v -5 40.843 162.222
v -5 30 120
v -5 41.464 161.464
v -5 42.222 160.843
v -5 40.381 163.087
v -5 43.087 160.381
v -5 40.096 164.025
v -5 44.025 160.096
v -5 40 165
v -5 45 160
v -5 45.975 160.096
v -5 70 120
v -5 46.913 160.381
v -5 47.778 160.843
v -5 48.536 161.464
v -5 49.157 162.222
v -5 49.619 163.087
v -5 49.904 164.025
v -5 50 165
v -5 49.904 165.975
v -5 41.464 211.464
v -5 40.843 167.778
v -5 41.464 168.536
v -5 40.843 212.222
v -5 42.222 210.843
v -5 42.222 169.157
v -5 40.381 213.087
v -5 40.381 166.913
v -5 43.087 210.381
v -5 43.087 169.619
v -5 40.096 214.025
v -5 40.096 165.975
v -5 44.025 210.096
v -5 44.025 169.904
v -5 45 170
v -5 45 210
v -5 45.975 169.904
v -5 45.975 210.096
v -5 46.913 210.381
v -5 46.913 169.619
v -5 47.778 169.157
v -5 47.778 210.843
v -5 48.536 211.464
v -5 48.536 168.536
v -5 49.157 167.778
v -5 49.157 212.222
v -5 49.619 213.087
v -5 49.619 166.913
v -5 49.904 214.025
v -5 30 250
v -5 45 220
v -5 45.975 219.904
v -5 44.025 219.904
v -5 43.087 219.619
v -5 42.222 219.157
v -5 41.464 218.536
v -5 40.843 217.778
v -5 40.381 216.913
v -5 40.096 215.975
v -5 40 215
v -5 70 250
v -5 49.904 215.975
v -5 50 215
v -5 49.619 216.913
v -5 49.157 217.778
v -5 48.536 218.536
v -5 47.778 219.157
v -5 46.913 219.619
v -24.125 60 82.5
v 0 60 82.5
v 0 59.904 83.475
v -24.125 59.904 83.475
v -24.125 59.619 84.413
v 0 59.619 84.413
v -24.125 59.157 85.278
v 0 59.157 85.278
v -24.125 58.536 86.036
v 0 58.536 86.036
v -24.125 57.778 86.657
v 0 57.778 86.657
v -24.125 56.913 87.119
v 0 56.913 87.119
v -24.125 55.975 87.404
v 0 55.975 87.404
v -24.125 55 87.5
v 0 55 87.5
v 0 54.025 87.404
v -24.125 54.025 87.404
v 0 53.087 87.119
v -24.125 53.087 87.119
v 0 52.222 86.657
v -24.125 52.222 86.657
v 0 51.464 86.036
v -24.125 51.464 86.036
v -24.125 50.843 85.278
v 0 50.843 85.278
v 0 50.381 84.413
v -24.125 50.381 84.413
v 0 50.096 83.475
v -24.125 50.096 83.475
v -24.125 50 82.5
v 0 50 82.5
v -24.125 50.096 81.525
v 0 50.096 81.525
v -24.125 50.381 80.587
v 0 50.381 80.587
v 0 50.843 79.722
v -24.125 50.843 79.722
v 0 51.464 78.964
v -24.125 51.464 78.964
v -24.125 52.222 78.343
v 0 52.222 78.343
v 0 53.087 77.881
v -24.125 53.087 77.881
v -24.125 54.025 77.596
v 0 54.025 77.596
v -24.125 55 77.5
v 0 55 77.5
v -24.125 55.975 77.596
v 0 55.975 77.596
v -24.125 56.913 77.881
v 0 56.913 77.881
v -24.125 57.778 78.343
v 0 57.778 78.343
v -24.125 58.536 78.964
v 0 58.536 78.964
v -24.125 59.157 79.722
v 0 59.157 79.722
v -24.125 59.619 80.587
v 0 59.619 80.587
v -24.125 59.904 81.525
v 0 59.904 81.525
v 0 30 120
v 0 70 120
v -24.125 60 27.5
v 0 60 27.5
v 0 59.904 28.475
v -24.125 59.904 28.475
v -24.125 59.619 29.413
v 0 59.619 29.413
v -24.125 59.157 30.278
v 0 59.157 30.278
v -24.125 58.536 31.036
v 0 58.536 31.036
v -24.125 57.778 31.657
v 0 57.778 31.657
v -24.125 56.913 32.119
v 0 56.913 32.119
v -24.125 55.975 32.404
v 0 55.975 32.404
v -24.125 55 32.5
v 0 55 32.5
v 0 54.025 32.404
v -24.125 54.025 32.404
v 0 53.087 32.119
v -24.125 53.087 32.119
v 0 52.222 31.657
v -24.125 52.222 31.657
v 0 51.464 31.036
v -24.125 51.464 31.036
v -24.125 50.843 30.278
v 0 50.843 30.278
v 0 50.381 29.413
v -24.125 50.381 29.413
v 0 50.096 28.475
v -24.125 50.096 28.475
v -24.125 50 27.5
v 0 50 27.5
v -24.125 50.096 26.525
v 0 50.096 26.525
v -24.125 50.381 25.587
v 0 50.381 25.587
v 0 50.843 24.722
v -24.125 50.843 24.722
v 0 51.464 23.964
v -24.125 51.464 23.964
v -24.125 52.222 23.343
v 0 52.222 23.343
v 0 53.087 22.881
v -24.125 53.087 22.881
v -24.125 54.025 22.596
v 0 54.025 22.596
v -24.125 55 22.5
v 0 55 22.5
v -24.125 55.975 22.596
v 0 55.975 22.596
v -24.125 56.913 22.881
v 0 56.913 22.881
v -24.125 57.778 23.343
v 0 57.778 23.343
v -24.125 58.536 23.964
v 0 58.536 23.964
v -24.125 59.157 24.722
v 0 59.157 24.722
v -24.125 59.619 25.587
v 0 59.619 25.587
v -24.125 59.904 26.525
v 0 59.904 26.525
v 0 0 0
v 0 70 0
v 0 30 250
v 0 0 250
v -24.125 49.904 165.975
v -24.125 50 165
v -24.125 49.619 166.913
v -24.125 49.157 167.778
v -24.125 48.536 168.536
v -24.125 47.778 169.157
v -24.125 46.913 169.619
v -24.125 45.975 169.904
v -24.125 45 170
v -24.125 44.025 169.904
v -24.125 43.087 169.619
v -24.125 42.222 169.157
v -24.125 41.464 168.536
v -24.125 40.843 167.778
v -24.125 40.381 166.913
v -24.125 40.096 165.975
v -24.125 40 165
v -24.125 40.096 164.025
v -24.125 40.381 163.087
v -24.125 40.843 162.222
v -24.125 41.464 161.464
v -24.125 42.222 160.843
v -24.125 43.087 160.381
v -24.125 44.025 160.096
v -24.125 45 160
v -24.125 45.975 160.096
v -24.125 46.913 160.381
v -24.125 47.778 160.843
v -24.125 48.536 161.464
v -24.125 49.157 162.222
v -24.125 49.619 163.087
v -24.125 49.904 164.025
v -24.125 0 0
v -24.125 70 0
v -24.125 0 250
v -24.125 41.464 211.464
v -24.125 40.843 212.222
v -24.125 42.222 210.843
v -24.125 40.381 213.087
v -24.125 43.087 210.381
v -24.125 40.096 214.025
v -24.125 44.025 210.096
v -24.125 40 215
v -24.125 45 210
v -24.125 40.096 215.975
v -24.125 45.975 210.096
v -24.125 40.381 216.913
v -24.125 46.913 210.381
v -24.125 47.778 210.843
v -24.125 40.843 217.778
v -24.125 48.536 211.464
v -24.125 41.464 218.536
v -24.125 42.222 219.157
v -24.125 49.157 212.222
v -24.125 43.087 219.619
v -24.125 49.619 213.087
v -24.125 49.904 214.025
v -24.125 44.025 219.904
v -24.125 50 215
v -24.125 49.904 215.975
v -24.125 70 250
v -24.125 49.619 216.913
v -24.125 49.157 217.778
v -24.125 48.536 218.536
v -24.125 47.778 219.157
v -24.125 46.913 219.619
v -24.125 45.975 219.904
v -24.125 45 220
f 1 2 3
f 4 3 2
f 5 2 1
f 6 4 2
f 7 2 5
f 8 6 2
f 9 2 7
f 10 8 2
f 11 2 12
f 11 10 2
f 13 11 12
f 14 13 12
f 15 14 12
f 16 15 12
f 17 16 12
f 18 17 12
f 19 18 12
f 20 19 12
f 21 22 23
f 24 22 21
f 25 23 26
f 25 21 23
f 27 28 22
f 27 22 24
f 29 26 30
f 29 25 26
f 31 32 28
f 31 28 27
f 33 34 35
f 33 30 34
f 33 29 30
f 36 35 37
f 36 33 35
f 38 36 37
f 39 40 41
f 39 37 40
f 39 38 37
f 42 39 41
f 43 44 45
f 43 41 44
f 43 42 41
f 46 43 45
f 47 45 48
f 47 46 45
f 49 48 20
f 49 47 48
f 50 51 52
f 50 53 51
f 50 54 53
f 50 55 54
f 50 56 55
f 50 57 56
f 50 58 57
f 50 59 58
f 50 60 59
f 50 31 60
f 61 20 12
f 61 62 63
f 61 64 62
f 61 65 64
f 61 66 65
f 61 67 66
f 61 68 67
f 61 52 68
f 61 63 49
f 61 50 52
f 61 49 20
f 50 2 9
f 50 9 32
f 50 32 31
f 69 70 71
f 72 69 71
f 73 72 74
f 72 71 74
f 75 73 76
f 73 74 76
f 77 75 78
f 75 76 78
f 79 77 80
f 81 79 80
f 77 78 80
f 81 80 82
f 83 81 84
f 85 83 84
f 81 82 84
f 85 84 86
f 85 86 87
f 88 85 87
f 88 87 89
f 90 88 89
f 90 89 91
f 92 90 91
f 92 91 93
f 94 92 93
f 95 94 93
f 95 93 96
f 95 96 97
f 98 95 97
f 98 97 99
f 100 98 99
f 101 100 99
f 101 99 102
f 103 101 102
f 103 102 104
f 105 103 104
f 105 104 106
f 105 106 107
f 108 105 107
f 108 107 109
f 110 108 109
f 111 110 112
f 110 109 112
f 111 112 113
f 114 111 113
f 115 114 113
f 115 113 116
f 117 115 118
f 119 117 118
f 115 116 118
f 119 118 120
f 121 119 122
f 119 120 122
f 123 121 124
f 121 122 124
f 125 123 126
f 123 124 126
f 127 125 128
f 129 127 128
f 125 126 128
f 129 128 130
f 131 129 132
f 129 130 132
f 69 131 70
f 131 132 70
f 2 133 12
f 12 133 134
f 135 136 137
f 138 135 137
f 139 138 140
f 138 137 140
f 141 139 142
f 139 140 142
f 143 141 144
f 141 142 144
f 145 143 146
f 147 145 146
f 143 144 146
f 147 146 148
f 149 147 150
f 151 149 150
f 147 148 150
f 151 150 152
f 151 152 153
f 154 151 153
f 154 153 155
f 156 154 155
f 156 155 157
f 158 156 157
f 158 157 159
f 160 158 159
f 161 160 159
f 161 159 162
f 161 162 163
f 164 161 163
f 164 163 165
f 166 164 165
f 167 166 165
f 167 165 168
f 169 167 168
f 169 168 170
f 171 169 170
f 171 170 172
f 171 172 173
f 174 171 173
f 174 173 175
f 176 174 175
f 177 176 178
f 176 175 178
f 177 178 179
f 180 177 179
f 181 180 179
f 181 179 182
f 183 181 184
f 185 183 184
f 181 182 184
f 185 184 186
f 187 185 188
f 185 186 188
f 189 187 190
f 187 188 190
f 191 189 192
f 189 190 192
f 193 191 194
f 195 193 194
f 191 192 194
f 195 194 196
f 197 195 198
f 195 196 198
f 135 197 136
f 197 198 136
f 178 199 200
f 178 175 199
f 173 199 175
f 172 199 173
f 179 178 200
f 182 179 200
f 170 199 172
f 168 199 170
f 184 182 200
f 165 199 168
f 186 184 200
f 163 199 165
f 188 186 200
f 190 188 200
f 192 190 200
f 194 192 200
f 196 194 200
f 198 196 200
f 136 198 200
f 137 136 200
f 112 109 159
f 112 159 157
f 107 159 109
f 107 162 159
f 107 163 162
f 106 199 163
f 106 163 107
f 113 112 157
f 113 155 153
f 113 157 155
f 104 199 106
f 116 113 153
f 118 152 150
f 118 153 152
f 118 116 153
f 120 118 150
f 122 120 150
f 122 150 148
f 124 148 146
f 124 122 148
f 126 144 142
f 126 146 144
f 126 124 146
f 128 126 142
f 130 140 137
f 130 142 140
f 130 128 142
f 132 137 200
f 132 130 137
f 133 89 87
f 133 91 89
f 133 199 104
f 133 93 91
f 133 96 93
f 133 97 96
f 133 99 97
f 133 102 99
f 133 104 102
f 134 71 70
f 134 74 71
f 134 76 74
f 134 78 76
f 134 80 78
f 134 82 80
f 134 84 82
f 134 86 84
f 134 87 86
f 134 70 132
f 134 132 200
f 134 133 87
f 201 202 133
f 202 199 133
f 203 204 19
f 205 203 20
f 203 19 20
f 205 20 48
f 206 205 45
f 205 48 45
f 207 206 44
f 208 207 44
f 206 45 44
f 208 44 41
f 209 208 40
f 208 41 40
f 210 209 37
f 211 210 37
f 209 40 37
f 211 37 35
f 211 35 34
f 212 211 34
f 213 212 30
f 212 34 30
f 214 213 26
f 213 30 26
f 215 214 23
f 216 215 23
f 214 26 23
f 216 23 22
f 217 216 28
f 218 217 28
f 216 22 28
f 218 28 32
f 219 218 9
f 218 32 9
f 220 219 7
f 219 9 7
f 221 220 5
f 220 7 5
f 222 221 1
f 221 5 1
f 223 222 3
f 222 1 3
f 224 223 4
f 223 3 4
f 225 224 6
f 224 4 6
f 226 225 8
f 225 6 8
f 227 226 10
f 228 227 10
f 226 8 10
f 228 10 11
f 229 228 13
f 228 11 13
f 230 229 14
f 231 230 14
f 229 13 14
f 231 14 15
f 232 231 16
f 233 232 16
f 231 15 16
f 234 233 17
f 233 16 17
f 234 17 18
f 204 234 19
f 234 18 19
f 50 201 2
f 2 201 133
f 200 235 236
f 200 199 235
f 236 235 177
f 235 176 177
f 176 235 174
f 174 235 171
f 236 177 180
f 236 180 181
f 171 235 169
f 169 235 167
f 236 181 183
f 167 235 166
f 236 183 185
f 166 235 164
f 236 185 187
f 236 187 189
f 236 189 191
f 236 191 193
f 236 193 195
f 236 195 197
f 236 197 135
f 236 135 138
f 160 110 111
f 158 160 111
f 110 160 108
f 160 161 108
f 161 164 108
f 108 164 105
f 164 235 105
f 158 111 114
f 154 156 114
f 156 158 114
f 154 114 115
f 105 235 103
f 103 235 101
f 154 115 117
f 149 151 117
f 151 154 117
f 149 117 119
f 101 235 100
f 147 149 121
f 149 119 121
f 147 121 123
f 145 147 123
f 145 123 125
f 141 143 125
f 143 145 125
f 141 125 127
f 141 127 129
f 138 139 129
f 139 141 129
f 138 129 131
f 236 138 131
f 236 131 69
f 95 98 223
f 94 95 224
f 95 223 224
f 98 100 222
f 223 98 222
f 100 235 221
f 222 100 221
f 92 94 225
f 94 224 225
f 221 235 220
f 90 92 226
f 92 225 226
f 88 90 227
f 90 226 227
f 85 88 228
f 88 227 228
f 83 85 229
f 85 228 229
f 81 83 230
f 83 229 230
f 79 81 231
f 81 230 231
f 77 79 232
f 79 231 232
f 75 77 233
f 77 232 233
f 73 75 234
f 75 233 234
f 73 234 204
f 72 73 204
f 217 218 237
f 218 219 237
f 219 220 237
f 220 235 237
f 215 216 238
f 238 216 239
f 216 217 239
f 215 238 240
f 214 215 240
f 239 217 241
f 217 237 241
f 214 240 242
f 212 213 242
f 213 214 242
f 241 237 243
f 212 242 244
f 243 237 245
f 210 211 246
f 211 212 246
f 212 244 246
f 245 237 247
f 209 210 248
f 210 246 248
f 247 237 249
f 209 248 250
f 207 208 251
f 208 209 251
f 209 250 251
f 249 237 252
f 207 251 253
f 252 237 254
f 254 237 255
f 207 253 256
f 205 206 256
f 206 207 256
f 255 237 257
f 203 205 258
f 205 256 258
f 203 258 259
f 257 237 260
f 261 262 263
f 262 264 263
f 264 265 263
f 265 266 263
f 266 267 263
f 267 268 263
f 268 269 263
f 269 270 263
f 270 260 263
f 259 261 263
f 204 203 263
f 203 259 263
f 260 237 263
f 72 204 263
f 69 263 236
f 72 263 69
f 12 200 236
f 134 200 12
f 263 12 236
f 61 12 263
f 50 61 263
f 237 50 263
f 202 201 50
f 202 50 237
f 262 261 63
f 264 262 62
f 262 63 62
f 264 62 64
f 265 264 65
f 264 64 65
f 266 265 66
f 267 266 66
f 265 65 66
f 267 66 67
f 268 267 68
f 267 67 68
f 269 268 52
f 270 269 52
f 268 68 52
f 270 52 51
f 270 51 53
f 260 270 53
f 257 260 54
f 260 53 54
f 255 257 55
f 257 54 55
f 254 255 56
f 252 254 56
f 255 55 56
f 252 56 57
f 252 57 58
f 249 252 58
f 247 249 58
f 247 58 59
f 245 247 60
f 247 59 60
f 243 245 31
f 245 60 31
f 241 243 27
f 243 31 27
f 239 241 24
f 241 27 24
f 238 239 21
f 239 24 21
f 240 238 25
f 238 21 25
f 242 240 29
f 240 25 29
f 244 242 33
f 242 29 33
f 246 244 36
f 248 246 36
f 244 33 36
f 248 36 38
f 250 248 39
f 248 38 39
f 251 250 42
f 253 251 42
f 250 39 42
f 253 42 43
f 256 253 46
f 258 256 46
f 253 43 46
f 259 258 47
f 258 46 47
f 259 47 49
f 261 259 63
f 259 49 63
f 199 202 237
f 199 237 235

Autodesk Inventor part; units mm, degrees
ref_plane "YZ Plane" through (0, 0, 0) normal (1, 0, 0) x (0, 1, 0)
ref_plane "XZ Plane" through (0, 0, 0) normal (0, 1, 0) x (-1, 0, 0)
ref_plane "XY Plane" through (0, 0, 0) normal (0, 0, 1) x (1, 0, 0)
sketch "Sketch1" plane through (0, 0, 0) normal (1, 0, 0) x (0, 1, 0)
  line L0 (0, 0) -> (70, 0)
  line L1 (70, 0) -> (70, 250)
  line L2 (70, 250) -> (0, 250)
  line L3 (0, 250) -> (0, 0)
  line L4 (70, 250) -> (30, 250)
  line L5 (30, 250) -> (30, 120)
  line L6 (30, 120) -> (70, 120)
  line L7 (70, 120) -> (70, 250)
  circle A0 centre (45, 215) radius 5
  circle A1 centre (45, 165) radius 5
  circle A2 centre (55, 82.5) radius 5
  circle A3 centre (55, 27.5) radius 5
  dimension "d0" = 70
  dimension "d1" = 250
  dimension "d2" = 50
  dimension "d3" = 10
  dimension "d4" = 25
  dimension "d5" = 130
  dimension "d6" = 40
  dimension "d7" = 35
  dimension "d12" = 10
  dimension "d13" = 15
  dimension "d14" = 55
  dimension "d15" = 27.5
extrude "Extrusion1" add sketch "Sketch1" against normal blind 24.125 contours L3 L2 L5 L6 L1 L0 | L6 L5 L2 L1 | A2 | A3
extrude "Extrusion2" cut sketch "Sketch1" against normal blind 5 contours L6 L5 L2 L1
extrude "Extrusion3" cut sketch "Sketch1" against normal through all contours A2 | A3
properties part number "bodybottompart"
